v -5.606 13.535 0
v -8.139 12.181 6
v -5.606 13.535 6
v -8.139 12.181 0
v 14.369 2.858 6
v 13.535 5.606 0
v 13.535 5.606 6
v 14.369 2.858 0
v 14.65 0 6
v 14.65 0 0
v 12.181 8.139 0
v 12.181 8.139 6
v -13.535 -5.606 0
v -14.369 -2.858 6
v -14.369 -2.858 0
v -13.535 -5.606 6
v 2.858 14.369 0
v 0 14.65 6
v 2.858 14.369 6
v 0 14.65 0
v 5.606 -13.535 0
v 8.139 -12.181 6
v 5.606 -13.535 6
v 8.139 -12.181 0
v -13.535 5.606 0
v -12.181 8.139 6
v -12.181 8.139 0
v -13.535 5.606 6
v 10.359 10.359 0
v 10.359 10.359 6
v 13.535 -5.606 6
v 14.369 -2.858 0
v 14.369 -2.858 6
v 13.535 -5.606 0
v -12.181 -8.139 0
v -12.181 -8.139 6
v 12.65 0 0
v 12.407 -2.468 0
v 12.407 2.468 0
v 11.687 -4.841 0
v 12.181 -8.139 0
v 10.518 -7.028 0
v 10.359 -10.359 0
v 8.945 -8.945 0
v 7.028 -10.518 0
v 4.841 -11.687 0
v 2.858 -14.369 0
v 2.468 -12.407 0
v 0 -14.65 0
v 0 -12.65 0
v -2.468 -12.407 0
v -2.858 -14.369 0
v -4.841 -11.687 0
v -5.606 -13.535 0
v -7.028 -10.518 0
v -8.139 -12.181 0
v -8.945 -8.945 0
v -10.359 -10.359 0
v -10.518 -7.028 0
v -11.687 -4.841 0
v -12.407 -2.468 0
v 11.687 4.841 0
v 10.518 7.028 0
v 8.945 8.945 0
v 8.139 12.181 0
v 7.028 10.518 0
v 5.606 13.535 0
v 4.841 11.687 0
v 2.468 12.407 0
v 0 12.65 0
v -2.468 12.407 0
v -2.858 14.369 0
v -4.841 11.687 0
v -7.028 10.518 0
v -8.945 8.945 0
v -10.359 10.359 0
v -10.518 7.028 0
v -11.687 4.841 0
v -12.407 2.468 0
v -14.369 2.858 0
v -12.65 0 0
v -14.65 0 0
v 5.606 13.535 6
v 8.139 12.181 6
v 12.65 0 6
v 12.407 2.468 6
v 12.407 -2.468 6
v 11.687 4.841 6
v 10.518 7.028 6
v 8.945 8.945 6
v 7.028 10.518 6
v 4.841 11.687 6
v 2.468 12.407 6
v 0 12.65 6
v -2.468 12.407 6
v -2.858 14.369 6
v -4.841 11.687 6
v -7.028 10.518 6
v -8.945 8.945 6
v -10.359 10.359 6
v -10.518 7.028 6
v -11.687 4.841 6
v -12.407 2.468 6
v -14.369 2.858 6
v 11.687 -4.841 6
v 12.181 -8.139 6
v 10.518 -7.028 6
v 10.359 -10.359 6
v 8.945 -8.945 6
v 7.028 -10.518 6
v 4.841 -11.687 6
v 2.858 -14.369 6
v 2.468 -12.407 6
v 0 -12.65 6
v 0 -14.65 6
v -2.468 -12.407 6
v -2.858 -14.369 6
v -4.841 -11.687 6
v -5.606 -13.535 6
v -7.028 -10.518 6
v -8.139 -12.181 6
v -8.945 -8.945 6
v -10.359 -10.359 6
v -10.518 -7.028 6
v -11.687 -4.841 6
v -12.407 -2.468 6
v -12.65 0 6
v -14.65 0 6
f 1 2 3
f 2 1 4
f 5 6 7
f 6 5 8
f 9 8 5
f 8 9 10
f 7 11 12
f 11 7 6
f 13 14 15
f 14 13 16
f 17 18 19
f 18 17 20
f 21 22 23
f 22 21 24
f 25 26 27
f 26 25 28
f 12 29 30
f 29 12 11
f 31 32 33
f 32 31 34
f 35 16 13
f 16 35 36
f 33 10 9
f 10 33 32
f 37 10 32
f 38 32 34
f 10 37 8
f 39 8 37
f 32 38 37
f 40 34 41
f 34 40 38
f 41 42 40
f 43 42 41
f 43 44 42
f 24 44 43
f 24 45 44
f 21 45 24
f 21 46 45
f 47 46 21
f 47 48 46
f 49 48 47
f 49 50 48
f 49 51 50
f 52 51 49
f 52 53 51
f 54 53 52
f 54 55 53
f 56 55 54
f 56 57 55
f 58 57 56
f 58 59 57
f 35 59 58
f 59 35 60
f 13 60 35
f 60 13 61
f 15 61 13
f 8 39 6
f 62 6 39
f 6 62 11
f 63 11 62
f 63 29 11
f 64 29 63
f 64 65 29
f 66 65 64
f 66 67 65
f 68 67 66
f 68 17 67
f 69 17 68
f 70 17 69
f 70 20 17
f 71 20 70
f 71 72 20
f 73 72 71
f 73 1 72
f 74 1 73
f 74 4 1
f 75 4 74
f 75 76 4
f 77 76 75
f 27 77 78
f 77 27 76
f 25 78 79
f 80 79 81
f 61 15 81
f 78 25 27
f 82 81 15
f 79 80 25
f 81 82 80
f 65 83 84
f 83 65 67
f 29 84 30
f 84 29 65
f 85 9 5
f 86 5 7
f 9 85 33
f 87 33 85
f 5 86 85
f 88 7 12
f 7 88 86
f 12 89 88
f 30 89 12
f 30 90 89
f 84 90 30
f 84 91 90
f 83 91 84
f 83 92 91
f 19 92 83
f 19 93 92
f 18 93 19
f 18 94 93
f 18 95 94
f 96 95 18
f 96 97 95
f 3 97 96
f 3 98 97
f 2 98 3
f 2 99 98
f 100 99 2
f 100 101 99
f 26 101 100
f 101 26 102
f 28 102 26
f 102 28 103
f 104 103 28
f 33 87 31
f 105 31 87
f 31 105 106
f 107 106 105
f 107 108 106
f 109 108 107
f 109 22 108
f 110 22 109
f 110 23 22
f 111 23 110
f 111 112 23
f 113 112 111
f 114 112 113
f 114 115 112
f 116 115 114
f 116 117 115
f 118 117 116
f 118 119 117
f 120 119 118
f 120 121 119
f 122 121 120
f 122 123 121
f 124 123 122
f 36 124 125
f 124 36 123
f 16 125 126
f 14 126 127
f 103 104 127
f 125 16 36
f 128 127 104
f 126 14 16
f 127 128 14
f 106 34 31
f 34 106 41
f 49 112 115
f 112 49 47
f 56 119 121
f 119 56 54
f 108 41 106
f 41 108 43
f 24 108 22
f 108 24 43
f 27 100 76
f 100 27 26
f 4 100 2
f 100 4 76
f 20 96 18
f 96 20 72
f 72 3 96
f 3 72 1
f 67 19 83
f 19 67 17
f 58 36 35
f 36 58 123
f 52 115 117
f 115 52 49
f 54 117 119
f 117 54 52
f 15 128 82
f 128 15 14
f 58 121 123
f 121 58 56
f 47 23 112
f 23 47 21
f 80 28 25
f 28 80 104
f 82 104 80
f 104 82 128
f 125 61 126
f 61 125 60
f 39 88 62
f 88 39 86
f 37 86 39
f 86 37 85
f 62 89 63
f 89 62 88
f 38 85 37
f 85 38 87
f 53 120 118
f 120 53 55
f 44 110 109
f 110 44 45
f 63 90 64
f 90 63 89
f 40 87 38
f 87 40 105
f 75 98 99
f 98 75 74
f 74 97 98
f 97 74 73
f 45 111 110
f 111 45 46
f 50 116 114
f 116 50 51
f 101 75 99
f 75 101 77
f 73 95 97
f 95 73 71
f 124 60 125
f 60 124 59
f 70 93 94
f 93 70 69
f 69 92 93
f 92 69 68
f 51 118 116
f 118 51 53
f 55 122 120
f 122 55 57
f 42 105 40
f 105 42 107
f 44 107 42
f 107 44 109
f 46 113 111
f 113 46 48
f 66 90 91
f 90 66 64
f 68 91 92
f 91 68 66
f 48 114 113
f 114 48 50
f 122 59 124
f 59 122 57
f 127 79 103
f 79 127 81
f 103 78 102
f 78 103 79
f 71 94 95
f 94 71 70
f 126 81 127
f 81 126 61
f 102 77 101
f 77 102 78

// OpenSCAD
$fn = 32;

// ----------------------------------------------------------------------
// Spacer sleeve: 29.3 / 25.3 x 6 mm
// ----------------------------------------------------------------------

// --- parameters (mm) ---
tube_d = 29.3;            // outside diameter
bore_d = 25.3;            // shaft bore
tube_l = 6;               // sleeve length
step_d = 28.5;            // reduced diameter
step_l = 1.98;            // length of the step

module sleeve() {
  cylinder(h = tube_l, d = tube_d);
  translate([0, 0, tube_l - step_l]) cylinder(h = step_l, d = step_d);
}

difference() {
  sleeve();
  translate([0, 0, -1]) cylinder(h = tube_l + 2, d = bore_d);
}
